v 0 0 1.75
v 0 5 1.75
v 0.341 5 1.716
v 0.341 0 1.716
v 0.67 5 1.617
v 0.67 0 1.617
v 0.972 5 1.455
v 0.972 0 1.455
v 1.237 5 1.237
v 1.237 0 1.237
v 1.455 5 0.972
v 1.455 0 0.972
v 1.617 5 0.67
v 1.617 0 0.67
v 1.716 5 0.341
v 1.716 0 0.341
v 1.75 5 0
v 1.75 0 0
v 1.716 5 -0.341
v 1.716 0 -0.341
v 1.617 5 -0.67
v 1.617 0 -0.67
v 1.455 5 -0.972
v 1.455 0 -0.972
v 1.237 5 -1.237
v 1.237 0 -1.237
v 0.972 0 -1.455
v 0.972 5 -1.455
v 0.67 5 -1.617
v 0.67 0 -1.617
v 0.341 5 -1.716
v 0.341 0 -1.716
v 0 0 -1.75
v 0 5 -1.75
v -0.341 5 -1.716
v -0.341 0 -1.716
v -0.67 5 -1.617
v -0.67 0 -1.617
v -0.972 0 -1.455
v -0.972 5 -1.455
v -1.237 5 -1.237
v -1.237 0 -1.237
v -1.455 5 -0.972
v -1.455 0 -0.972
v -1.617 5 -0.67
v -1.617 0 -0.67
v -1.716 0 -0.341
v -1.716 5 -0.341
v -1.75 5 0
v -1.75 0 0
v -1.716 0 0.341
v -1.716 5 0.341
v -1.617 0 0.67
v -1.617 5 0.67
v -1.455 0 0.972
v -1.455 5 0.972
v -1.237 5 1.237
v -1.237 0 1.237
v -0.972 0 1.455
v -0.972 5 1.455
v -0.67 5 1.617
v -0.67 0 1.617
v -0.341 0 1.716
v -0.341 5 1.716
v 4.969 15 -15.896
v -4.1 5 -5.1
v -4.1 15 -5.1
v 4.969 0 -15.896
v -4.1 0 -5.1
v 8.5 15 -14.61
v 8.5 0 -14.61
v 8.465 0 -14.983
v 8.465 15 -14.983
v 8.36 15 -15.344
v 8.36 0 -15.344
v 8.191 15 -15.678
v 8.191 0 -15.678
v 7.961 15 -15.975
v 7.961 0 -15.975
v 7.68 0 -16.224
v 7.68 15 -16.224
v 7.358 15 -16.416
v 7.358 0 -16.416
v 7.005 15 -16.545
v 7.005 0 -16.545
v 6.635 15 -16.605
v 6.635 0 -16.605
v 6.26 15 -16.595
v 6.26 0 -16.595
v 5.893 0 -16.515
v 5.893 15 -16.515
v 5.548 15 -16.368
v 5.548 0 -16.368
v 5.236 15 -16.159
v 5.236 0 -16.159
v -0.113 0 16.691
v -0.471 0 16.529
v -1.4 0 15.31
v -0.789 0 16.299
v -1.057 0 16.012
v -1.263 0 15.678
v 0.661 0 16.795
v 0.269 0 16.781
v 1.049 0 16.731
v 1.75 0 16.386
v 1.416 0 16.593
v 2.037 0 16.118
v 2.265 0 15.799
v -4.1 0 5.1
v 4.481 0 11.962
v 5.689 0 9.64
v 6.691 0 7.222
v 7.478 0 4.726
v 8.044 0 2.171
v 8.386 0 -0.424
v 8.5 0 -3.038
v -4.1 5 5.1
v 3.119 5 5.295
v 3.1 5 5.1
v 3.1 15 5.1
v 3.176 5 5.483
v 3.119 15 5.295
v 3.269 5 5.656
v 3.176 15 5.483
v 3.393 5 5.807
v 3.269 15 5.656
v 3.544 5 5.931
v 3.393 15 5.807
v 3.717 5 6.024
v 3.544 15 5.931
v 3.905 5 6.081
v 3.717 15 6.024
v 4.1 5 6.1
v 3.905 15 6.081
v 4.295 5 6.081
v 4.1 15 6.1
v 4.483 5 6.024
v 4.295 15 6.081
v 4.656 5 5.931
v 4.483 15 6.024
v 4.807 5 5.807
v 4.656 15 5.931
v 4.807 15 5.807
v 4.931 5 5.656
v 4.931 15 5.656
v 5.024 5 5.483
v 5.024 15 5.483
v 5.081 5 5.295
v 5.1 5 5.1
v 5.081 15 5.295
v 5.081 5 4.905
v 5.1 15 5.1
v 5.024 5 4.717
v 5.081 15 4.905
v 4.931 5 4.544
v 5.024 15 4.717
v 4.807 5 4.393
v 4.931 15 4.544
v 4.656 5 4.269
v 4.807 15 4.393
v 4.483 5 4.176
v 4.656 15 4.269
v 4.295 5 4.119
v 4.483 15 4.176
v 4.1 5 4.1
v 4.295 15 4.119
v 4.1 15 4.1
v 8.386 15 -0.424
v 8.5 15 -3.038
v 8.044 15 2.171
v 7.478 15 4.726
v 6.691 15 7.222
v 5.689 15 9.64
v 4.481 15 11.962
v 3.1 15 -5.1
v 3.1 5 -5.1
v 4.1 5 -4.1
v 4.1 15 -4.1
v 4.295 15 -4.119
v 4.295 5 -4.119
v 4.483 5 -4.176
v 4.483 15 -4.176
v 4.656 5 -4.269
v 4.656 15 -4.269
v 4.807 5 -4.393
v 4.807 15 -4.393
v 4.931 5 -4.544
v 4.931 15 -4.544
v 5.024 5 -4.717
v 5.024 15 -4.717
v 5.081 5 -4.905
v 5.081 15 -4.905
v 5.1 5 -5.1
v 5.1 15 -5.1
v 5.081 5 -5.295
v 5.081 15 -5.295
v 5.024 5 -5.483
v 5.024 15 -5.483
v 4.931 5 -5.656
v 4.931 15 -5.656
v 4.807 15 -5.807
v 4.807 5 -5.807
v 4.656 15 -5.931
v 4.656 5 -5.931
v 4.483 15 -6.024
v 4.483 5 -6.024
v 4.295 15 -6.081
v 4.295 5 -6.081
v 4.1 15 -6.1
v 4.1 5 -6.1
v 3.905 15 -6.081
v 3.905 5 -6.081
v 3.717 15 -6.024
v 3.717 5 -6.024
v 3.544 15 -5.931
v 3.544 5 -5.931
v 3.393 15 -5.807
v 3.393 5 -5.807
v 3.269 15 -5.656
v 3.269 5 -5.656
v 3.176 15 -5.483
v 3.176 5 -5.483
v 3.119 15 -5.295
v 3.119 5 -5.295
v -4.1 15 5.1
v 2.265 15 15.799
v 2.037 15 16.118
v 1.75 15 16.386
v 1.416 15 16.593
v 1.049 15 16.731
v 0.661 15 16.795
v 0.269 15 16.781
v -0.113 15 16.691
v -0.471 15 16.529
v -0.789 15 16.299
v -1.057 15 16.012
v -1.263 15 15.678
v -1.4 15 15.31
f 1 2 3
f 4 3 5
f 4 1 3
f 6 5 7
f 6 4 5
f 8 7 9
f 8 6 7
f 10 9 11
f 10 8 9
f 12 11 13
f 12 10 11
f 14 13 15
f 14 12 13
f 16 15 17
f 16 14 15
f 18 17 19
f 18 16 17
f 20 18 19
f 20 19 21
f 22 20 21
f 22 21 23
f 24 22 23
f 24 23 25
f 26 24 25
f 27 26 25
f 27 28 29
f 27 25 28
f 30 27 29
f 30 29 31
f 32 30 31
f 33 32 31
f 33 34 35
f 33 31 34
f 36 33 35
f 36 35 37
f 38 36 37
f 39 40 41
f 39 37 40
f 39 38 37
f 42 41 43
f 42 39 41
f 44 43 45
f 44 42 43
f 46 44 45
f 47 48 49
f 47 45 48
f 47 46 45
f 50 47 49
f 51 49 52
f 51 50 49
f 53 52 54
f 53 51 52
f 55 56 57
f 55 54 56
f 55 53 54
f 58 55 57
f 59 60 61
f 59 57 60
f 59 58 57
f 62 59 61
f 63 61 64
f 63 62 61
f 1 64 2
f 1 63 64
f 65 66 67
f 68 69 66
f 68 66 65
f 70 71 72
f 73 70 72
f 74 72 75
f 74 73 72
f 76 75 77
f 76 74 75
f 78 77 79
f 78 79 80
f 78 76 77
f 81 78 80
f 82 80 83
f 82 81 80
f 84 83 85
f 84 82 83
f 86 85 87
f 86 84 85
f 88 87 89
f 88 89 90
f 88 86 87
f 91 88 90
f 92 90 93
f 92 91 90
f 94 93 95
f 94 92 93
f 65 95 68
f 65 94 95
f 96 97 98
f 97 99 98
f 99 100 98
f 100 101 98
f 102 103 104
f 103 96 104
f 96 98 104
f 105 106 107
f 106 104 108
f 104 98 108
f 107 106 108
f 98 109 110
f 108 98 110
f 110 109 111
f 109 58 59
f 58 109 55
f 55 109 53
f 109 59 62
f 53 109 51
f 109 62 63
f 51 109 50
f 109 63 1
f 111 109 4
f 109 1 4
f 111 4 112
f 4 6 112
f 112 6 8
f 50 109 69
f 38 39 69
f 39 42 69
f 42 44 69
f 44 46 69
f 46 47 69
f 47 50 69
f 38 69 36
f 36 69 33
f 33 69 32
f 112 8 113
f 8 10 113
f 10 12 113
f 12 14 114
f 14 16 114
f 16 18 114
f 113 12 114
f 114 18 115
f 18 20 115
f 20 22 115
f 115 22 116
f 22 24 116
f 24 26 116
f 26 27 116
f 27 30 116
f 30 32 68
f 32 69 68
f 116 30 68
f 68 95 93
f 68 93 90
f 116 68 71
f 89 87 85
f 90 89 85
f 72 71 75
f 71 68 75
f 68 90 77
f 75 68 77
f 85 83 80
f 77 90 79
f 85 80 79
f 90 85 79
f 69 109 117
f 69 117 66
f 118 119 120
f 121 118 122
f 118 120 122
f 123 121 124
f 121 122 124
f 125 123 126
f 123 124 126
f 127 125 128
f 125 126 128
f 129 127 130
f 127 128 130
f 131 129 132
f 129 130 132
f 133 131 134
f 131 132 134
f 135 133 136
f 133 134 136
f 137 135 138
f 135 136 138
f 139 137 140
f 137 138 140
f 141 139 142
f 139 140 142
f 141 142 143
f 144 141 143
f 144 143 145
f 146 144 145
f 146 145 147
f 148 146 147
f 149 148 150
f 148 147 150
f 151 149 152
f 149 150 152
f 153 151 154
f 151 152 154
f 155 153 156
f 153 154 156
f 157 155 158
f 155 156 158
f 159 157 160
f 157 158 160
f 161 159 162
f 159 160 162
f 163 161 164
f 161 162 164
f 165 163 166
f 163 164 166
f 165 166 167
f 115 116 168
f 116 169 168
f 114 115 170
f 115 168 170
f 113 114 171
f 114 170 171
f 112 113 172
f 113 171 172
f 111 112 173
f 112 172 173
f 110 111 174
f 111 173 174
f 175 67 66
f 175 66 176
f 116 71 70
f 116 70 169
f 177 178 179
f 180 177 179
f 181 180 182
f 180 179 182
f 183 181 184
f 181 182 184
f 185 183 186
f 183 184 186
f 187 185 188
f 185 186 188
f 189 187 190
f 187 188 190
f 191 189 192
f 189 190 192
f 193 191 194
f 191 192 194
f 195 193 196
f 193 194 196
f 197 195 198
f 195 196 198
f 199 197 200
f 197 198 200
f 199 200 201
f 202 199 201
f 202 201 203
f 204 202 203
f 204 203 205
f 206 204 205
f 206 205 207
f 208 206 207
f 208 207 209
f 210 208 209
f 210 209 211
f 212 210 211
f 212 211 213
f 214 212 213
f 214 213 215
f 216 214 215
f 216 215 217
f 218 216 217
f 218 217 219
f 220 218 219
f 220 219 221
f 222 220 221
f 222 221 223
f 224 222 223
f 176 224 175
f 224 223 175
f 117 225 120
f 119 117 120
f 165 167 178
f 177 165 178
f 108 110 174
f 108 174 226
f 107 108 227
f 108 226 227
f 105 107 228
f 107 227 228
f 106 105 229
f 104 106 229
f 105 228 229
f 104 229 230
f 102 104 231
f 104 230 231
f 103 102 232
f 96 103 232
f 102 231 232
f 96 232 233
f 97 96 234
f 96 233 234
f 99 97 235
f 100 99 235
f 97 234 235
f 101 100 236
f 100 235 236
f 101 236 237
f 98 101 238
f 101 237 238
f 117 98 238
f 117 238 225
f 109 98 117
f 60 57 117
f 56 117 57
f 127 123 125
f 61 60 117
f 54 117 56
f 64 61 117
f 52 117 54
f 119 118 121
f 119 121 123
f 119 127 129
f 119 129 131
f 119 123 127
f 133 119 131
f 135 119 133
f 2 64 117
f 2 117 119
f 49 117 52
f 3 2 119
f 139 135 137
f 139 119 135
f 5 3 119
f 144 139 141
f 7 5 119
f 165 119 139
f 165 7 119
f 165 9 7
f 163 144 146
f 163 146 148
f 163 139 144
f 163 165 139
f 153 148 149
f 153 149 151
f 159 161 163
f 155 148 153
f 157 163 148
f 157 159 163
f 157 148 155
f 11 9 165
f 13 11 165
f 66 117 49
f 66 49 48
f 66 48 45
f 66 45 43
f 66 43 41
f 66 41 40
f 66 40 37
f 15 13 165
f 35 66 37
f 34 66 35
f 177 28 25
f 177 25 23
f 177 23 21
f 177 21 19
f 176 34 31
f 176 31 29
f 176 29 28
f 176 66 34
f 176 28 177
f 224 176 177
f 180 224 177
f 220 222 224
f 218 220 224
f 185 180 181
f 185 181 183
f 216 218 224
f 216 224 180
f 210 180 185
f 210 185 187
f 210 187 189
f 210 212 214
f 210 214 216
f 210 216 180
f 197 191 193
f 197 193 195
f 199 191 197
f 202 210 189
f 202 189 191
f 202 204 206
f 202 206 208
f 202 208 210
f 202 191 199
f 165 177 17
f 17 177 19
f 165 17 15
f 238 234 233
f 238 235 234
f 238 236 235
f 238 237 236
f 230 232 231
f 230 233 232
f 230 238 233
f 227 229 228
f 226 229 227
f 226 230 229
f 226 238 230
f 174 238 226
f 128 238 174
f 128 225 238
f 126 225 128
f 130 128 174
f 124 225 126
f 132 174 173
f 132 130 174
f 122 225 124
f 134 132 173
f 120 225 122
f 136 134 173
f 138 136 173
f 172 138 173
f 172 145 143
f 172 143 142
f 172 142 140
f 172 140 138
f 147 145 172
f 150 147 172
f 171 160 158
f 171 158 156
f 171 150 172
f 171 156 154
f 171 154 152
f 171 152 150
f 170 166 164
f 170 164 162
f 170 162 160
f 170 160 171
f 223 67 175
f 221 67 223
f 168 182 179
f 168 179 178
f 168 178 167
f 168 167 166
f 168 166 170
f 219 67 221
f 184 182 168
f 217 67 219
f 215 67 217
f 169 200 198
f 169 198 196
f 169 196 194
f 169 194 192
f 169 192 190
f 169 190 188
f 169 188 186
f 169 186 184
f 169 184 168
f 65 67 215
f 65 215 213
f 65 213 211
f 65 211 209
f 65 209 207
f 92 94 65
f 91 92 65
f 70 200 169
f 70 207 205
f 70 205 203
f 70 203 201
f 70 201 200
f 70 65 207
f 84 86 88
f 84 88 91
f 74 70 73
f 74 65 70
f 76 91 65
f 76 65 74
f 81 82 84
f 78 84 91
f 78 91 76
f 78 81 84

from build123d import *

# Parameters (mm, degrees)
SKETCH_1_W          = 8.2
SKETCH_1_H          = 10.2
SKETCH_1_R          = 1.75
EXTRUDE_1_DEPTH     = 15
SKETCH_2_W          = 8.2
SKETCH_2_H          = 10.2
CUT_EXTRUDE_1_DEPTH = 10
SKETCH_4_R          = 1
CUT_EXTRUDE_2_DEPTH = 10
FILLET_1_R          = 30
FILLET_2_R          = 2


with BuildPart() as part:
    # ｽｹｯﾁ1 → ﾎﾞｽ - 押し出し1 (new body)
    # profile 1 of 2: a face of its own
    with BuildSketch(Plane(origin=(0, 0, 0), x_dir=(1, 0, 0), z_dir=(0, 1, 0))):
        Polygon((-0.160254038, -20), (-4.1, -5.1), (4.1, -5.1), (4.1, 5.1), (-4.1, 5.1), (8.5, 20.1), (8.5, -5), align=None)
    # profile 2 of 2: a face of its own
    with BuildSketch(Plane(origin=(0, 0, 0), x_dir=(1, 0, 0), z_dir=(0, 1, 0))):
        Rectangle(SKETCH_1_W, SKETCH_1_H)
        with Locations(Location((0, 0, 0), (0, 0, 270))):
            Circle(SKETCH_1_R, mode=Mode.SUBTRACT)
    extrude(amount=EXTRUDE_1_DEPTH)

    # ｽｹｯﾁ2 → ｶｯﾄ - 押し出し1 (cut)
    with BuildSketch(Plane(origin=(0, 15, 0), x_dir=(1, 0, 0), z_dir=(0, 1, 0))):
        Rectangle(SKETCH_2_W, SKETCH_2_H)
    extrude(amount=-CUT_EXTRUDE_1_DEPTH, mode=Mode.SUBTRACT)

    # ｽｹｯﾁ4 → ｶｯﾄ - 押し出し2 (cut)
    with BuildSketch(Plane(origin=(0, 15, 0), x_dir=(1, 0, 0), z_dir=(0, 1, 0))):
        with Locations((4.1, 5.1)):
            Circle(SKETCH_4_R)
        with Locations((4.1, -5.1)):
            Circle(SKETCH_4_R)
    extrude(amount=-CUT_EXTRUDE_2_DEPTH, mode=Mode.SUBTRACT)

    # ﾌｨﾚｯﾄ1
    fillet_1_edges = [part.edges().sort_by_distance(p)[0] for p in [
        (8.5, 7.5, 5),
    ]]
    fillet(fillet_1_edges, radius=FILLET_1_R)

    # ﾌｨﾚｯﾄ2
    fillet_2_edges = [part.edges().sort_by_distance(p)[0] for p in [
        (8.5, 7.5, -20.1),
        (-0.160254038, 7.5, 20),
    ]]
    fillet(fillet_2_edges, radius=FILLET_2_R)


solid = part.part
